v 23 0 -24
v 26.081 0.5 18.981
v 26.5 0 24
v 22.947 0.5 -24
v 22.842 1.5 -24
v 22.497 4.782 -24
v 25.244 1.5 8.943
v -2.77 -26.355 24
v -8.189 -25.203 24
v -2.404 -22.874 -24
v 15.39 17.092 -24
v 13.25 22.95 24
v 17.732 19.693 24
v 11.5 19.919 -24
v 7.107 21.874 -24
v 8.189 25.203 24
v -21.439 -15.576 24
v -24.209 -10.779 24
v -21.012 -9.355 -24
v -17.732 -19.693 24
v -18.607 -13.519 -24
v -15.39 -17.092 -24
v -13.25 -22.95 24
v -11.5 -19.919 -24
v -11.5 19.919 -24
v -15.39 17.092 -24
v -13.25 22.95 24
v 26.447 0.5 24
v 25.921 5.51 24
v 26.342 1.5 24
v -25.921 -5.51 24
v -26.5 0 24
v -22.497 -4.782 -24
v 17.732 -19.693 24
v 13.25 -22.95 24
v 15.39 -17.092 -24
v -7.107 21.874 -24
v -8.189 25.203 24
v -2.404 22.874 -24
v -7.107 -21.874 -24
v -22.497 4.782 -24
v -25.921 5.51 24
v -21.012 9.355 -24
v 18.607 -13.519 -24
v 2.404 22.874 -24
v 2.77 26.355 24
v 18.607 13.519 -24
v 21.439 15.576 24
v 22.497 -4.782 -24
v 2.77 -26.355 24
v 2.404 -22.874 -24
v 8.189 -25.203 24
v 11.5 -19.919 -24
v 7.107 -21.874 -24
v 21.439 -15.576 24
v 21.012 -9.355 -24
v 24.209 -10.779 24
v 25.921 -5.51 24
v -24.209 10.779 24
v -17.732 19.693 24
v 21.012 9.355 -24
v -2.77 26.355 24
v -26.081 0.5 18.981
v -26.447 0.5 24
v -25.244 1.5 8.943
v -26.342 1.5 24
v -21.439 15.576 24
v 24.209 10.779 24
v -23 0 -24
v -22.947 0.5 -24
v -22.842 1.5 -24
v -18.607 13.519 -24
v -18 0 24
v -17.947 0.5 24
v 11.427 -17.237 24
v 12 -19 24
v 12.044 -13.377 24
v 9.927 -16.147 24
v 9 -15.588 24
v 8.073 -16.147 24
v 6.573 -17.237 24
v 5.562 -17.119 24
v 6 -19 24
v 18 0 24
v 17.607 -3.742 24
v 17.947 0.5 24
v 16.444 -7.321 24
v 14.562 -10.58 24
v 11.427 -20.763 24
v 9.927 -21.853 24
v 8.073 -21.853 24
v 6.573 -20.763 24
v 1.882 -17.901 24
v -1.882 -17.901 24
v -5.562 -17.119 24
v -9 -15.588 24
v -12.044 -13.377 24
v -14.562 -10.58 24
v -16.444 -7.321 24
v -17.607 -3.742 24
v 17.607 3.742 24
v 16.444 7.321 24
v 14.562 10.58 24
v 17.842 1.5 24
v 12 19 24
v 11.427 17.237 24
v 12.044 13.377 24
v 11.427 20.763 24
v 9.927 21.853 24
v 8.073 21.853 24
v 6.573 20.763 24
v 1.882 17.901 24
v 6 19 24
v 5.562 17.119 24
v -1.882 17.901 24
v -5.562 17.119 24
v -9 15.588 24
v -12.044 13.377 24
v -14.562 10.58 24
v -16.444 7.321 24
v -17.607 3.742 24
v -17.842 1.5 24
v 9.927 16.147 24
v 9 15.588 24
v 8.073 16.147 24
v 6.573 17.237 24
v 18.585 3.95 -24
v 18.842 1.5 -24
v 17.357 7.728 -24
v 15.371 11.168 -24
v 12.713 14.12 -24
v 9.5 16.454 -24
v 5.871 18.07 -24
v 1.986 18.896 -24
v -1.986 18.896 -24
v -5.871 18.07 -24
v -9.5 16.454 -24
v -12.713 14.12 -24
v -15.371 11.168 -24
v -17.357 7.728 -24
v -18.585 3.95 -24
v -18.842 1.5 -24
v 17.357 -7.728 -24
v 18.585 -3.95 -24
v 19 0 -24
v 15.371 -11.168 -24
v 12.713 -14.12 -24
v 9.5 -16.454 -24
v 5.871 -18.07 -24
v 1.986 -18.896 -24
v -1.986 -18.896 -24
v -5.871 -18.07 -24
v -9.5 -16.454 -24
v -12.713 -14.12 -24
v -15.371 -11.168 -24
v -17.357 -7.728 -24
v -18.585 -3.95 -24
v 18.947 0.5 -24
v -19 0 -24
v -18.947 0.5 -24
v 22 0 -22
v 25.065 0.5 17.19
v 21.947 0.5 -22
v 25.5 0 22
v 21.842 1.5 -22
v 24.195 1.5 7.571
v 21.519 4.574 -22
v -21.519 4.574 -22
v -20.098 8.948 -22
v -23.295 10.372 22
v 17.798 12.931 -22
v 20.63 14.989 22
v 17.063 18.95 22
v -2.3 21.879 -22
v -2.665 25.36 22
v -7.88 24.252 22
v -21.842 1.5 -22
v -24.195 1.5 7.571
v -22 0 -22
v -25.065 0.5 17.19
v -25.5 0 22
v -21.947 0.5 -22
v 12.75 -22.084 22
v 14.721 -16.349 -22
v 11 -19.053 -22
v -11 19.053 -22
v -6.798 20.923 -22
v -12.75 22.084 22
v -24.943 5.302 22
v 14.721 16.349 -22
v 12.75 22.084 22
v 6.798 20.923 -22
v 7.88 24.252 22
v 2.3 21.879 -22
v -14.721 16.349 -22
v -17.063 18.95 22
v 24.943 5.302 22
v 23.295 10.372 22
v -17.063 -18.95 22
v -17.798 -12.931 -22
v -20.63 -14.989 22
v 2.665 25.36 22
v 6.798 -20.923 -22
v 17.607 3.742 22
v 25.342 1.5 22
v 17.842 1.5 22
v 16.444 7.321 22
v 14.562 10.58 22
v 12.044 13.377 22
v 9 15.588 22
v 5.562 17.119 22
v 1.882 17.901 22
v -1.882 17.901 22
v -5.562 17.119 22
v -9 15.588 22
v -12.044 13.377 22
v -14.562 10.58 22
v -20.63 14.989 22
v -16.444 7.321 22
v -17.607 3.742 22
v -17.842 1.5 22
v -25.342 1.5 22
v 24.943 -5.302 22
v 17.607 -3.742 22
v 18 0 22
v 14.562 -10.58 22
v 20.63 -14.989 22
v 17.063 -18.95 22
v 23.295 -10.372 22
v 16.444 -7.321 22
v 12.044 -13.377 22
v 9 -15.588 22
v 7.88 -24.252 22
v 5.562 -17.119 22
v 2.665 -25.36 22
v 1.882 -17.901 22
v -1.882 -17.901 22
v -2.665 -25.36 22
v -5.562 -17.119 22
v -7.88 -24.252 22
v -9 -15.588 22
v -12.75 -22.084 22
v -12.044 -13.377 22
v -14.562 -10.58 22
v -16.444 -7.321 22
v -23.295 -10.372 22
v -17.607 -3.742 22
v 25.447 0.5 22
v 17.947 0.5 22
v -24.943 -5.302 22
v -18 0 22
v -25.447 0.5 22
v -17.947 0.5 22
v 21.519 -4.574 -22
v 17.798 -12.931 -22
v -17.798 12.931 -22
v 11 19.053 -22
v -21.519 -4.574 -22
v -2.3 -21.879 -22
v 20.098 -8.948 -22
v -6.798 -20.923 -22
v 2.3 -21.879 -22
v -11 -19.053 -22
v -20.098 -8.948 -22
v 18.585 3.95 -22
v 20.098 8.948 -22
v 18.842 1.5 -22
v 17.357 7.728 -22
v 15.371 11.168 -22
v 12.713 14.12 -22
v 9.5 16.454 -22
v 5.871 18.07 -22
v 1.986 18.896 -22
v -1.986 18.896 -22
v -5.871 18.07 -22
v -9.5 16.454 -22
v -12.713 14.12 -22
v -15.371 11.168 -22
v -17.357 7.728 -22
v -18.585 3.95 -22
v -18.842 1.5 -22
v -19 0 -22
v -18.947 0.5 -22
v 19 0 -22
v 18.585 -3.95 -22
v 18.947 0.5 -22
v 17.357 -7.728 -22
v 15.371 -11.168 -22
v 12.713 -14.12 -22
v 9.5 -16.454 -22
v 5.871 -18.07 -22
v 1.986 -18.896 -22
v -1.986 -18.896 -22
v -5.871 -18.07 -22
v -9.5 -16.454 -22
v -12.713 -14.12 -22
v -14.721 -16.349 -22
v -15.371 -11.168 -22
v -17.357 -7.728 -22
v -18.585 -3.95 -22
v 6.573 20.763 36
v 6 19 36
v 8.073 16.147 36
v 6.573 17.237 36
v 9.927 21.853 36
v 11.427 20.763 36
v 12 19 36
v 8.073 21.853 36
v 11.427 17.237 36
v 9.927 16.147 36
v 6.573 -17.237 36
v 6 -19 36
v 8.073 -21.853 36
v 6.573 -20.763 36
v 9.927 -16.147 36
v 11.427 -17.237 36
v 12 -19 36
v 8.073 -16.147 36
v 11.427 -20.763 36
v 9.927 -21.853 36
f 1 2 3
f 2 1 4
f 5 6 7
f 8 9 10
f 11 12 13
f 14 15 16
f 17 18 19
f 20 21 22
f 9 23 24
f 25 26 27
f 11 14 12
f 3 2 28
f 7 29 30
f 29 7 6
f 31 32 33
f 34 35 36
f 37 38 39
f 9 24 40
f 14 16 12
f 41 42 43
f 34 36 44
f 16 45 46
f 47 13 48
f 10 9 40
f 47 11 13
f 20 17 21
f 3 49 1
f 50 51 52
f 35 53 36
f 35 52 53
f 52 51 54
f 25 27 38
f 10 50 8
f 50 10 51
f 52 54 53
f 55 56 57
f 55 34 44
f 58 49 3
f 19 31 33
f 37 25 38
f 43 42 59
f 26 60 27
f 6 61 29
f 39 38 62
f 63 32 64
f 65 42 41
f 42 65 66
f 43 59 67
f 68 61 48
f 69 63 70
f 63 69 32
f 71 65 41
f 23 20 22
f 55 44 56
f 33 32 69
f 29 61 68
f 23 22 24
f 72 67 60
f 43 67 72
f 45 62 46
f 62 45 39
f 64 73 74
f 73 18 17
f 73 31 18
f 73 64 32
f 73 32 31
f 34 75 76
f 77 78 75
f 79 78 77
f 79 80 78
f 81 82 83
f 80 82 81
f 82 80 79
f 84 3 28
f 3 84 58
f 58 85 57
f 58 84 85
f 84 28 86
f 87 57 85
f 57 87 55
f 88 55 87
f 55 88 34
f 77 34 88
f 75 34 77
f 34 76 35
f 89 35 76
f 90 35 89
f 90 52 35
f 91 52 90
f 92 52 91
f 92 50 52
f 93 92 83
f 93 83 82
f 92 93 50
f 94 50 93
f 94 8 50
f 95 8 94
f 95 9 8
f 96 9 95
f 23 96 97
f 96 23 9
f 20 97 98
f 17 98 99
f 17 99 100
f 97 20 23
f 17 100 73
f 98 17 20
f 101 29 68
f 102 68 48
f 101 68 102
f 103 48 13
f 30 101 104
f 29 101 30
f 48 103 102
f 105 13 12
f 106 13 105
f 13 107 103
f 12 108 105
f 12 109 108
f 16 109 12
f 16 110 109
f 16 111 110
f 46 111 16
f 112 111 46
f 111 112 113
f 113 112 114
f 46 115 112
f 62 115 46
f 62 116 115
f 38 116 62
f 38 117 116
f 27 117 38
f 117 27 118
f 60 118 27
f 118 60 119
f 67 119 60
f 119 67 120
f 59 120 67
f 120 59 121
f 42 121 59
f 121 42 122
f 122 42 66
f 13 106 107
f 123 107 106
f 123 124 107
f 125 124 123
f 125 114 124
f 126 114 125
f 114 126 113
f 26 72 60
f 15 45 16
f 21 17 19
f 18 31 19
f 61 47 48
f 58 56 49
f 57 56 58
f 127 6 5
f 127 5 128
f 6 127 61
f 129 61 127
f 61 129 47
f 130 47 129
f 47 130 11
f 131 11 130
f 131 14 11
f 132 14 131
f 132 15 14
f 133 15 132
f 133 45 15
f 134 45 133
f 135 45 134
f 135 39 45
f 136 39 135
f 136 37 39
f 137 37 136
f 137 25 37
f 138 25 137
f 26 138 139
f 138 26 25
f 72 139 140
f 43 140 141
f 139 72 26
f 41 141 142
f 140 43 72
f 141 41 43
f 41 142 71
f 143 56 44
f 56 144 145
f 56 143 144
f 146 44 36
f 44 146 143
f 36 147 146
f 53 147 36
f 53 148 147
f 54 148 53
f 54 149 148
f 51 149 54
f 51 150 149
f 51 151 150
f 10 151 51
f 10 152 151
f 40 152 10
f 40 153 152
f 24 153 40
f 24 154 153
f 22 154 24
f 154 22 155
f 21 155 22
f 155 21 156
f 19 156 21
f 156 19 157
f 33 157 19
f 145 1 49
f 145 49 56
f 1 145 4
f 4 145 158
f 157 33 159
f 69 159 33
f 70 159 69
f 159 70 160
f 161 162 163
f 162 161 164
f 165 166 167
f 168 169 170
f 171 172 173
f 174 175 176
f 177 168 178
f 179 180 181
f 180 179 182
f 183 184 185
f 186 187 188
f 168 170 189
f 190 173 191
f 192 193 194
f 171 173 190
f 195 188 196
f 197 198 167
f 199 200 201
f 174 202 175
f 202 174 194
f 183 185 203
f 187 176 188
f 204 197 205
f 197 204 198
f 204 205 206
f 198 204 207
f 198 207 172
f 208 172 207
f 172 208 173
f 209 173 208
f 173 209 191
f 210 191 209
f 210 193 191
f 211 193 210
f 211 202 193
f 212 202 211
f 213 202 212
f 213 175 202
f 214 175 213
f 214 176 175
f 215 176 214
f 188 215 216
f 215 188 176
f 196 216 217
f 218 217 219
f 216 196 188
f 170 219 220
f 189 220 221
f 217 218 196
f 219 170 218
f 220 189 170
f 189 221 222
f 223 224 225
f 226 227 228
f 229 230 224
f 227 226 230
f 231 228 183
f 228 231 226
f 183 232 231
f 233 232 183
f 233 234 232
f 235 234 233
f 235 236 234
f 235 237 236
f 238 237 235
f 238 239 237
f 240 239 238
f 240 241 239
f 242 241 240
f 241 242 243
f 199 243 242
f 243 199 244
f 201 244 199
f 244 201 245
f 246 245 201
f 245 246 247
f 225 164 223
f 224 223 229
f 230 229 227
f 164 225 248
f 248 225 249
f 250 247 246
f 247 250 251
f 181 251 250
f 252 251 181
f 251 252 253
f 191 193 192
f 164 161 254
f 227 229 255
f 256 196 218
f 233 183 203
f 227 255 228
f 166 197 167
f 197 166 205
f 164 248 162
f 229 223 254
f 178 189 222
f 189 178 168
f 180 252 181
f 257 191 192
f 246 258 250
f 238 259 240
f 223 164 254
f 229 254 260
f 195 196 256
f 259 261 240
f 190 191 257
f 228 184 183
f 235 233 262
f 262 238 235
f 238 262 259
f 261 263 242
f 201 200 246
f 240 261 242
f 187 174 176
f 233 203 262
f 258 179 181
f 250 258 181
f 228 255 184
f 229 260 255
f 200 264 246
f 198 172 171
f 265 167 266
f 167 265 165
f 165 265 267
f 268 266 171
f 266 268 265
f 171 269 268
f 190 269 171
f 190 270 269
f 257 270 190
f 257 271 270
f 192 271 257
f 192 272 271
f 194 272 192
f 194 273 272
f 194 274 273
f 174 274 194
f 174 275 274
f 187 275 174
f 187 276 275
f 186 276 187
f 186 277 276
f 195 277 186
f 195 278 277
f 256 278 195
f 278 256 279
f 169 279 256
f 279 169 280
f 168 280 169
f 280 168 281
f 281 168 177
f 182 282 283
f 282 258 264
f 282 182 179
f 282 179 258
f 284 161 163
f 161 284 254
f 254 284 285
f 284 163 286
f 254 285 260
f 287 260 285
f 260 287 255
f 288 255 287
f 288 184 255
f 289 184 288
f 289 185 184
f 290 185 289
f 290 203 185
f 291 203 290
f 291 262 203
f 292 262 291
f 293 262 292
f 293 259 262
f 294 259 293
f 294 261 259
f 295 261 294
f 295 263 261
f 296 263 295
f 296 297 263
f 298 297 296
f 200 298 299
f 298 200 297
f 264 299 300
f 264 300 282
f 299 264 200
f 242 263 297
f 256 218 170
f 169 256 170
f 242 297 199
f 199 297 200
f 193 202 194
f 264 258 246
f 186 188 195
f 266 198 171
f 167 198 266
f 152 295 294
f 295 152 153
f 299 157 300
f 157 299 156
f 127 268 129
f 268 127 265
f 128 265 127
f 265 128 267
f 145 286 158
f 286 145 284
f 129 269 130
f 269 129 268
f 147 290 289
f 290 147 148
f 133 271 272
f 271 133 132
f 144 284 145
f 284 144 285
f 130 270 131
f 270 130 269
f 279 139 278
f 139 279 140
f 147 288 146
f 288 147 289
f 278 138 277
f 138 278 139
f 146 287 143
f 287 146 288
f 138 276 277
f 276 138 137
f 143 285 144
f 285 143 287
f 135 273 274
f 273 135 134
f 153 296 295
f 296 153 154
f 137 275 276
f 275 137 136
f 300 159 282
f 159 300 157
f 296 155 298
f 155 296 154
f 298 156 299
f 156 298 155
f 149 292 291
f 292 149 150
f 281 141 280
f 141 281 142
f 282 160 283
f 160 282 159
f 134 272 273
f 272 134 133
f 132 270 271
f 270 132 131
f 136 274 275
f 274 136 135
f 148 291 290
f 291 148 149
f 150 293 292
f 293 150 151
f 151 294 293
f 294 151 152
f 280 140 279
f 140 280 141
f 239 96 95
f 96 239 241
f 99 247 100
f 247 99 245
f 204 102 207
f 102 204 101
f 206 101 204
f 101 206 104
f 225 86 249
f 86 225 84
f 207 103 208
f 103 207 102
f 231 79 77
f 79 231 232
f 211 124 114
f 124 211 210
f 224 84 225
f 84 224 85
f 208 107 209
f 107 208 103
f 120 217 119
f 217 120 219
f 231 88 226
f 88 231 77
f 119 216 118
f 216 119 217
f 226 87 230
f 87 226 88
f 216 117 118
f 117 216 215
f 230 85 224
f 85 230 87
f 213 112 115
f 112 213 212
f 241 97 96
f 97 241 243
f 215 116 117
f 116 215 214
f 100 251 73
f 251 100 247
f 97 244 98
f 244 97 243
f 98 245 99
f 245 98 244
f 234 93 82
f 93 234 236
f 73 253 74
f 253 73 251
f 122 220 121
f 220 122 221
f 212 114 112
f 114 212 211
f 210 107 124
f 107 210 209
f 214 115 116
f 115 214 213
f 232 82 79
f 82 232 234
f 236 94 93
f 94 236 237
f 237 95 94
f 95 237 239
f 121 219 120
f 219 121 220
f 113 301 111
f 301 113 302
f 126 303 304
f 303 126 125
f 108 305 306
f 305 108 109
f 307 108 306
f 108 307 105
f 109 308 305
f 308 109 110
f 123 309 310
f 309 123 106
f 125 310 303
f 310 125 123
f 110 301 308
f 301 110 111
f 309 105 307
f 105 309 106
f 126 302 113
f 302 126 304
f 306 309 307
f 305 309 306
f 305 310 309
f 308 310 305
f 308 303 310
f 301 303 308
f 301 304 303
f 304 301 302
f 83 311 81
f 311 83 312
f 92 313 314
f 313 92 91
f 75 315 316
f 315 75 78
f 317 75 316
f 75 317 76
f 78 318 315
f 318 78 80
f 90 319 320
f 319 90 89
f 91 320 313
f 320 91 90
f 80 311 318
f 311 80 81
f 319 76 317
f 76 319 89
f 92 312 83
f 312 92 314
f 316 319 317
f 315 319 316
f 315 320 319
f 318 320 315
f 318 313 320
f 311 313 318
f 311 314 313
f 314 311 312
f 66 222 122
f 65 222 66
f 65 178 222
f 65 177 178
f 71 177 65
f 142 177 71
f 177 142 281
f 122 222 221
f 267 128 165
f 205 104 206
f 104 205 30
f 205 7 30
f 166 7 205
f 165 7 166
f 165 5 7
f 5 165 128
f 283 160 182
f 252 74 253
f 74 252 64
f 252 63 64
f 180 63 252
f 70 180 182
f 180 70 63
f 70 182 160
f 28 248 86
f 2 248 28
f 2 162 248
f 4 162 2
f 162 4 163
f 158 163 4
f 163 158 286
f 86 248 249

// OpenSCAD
intersection() {
    difference() {
        union() {
            difference() {
                
                // outside tapered cylinder shell
                cylinder(h=48,r1=23,r2=26.5,center=true);
                
                // the hollow center
                cylinder(h=44,r1=22,r2=25.5,center=true);
                
                translate([0,0,-23]) {
                    // rear z-axis hole
                    cylinder(h=2,r=19,center=true);
                    }
                    
                translate([0,0,23]) {
                    // front z-axis hole
                    cylinder(h=2,r=18,center=true);
                    }
            }
            
            // standoffs for mounting stepper motor
            translate([9,19,30]) {
                
                cylinder(h=12,r=3,center=true);
                }
                
            translate([9,-19,30]) {
                cylinder(h=12,r=3,center=true);
                }
        }
        // split whole object in two
        translate([0,1,24]) {
                cube([100,1,100], center = true);
        }
    }
}
